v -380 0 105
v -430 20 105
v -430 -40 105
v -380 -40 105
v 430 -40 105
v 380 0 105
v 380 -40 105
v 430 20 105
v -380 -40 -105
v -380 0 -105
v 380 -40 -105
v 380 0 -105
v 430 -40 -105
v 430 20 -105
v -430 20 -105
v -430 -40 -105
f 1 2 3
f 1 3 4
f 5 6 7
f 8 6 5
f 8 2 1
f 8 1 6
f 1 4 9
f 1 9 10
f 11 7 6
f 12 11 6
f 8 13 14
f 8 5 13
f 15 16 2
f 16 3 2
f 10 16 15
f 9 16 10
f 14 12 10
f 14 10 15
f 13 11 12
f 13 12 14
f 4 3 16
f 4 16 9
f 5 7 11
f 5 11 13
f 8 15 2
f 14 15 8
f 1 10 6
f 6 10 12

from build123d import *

# Parameters (mm, degrees)
SKETCH1_W                       = 860
SKETCH1_H                       = 210
BOSS_EXTRUDE1_DEPTH             = 20
BOSS_EXTRUDE2_REACH             = 445.086
SKETCH2_W                       = 50
SKETCH2_H                       = 40
BOSS_EXTRUDE2_DIRECTION_2_REACH = 445.086


with BuildPart() as part:
    # Sketch1 → Boss-Extrude1 (new body)
    with BuildSketch(Plane(origin=(0, 0, 0), x_dir=(1, 0, 0), z_dir=(0, 1, 0))):
        Rectangle(SKETCH1_W, SKETCH1_H)
    extrude(amount=BOSS_EXTRUDE1_DEPTH)

    # Boss-Extrude2: up to this face of the body (flat: up to its plane)
    boss_extrude2_end = Plane(part.part.faces().sort_by_distance((0, 10, 105))[0])
    # Sketch2 → Boss-Extrude2 (add, up to the picked face)
    with BuildSketch(Plane.XY, mode=Mode.PRIVATE) as boss_extrude2_sk1:
        with Locations((-405, -20)):
            Rectangle(SKETCH2_W, SKETCH2_H)
    boss_extrude2_tool1 = split(extrude(boss_extrude2_sk1.sketch, amount=BOSS_EXTRUDE2_REACH, mode=Mode.PRIVATE), bisect_by=boss_extrude2_end, keep=Keep.BOTH, mode=Mode.PRIVATE)
    # Sketch2 → Boss-Extrude2 (add, up to the picked face)
    with BuildSketch(Plane.XY, mode=Mode.PRIVATE) as boss_extrude2_sk2:
        with Locations((405, -20)):
            Rectangle(SKETCH2_W, SKETCH2_H)
    boss_extrude2_tool2 = split(extrude(boss_extrude2_sk2.sketch, amount=BOSS_EXTRUDE2_REACH, mode=Mode.PRIVATE), bisect_by=boss_extrude2_end, keep=Keep.BOTH, mode=Mode.PRIVATE)
    add(boss_extrude2_tool1.solids().sort_by(Axis((-405, -20, 0), (0, 0, 1)))[0])
    add(boss_extrude2_tool2.solids().sort_by(Axis((405, -20, 0), (0, 0, 1)))[0])

    # Boss-Extrude2 direction 2: up to this face of the body (flat: up to its plane)
    boss_extrude2_direction_2_end = Plane(part.part.faces().sort_by_distance((0, 10, -105))[0])
    # Sketch2 → Boss-Extrude2 direction 2 (add, up to the picked face)
    with BuildSketch(Plane.XY, mode=Mode.PRIVATE) as boss_extrude2_direction_2_sk1:
        with Locations((-405, -20)):
            Rectangle(SKETCH2_W, SKETCH2_H)
    boss_extrude2_direction_2_tool1 = split(extrude(boss_extrude2_direction_2_sk1.sketch, amount=-BOSS_EXTRUDE2_DIRECTION_2_REACH, mode=Mode.PRIVATE), bisect_by=boss_extrude2_direction_2_end, keep=Keep.BOTH, mode=Mode.PRIVATE)
    # Sketch2 → Boss-Extrude2 direction 2 (add, up to the picked face)
    with BuildSketch(Plane.XY, mode=Mode.PRIVATE) as boss_extrude2_direction_2_sk2:
        with Locations((405, -20)):
            Rectangle(SKETCH2_W, SKETCH2_H)
    boss_extrude2_direction_2_tool2 = split(extrude(boss_extrude2_direction_2_sk2.sketch, amount=-BOSS_EXTRUDE2_DIRECTION_2_REACH, mode=Mode.PRIVATE), bisect_by=boss_extrude2_direction_2_end, keep=Keep.BOTH, mode=Mode.PRIVATE)
    add(boss_extrude2_direction_2_tool1.solids().sort_by(Axis((-405, -20, 0), (0, 0, -1)))[0])
    add(boss_extrude2_direction_2_tool2.solids().sort_by(Axis((405, -20, 0), (0, 0, -1)))[0])


solid = part.part
